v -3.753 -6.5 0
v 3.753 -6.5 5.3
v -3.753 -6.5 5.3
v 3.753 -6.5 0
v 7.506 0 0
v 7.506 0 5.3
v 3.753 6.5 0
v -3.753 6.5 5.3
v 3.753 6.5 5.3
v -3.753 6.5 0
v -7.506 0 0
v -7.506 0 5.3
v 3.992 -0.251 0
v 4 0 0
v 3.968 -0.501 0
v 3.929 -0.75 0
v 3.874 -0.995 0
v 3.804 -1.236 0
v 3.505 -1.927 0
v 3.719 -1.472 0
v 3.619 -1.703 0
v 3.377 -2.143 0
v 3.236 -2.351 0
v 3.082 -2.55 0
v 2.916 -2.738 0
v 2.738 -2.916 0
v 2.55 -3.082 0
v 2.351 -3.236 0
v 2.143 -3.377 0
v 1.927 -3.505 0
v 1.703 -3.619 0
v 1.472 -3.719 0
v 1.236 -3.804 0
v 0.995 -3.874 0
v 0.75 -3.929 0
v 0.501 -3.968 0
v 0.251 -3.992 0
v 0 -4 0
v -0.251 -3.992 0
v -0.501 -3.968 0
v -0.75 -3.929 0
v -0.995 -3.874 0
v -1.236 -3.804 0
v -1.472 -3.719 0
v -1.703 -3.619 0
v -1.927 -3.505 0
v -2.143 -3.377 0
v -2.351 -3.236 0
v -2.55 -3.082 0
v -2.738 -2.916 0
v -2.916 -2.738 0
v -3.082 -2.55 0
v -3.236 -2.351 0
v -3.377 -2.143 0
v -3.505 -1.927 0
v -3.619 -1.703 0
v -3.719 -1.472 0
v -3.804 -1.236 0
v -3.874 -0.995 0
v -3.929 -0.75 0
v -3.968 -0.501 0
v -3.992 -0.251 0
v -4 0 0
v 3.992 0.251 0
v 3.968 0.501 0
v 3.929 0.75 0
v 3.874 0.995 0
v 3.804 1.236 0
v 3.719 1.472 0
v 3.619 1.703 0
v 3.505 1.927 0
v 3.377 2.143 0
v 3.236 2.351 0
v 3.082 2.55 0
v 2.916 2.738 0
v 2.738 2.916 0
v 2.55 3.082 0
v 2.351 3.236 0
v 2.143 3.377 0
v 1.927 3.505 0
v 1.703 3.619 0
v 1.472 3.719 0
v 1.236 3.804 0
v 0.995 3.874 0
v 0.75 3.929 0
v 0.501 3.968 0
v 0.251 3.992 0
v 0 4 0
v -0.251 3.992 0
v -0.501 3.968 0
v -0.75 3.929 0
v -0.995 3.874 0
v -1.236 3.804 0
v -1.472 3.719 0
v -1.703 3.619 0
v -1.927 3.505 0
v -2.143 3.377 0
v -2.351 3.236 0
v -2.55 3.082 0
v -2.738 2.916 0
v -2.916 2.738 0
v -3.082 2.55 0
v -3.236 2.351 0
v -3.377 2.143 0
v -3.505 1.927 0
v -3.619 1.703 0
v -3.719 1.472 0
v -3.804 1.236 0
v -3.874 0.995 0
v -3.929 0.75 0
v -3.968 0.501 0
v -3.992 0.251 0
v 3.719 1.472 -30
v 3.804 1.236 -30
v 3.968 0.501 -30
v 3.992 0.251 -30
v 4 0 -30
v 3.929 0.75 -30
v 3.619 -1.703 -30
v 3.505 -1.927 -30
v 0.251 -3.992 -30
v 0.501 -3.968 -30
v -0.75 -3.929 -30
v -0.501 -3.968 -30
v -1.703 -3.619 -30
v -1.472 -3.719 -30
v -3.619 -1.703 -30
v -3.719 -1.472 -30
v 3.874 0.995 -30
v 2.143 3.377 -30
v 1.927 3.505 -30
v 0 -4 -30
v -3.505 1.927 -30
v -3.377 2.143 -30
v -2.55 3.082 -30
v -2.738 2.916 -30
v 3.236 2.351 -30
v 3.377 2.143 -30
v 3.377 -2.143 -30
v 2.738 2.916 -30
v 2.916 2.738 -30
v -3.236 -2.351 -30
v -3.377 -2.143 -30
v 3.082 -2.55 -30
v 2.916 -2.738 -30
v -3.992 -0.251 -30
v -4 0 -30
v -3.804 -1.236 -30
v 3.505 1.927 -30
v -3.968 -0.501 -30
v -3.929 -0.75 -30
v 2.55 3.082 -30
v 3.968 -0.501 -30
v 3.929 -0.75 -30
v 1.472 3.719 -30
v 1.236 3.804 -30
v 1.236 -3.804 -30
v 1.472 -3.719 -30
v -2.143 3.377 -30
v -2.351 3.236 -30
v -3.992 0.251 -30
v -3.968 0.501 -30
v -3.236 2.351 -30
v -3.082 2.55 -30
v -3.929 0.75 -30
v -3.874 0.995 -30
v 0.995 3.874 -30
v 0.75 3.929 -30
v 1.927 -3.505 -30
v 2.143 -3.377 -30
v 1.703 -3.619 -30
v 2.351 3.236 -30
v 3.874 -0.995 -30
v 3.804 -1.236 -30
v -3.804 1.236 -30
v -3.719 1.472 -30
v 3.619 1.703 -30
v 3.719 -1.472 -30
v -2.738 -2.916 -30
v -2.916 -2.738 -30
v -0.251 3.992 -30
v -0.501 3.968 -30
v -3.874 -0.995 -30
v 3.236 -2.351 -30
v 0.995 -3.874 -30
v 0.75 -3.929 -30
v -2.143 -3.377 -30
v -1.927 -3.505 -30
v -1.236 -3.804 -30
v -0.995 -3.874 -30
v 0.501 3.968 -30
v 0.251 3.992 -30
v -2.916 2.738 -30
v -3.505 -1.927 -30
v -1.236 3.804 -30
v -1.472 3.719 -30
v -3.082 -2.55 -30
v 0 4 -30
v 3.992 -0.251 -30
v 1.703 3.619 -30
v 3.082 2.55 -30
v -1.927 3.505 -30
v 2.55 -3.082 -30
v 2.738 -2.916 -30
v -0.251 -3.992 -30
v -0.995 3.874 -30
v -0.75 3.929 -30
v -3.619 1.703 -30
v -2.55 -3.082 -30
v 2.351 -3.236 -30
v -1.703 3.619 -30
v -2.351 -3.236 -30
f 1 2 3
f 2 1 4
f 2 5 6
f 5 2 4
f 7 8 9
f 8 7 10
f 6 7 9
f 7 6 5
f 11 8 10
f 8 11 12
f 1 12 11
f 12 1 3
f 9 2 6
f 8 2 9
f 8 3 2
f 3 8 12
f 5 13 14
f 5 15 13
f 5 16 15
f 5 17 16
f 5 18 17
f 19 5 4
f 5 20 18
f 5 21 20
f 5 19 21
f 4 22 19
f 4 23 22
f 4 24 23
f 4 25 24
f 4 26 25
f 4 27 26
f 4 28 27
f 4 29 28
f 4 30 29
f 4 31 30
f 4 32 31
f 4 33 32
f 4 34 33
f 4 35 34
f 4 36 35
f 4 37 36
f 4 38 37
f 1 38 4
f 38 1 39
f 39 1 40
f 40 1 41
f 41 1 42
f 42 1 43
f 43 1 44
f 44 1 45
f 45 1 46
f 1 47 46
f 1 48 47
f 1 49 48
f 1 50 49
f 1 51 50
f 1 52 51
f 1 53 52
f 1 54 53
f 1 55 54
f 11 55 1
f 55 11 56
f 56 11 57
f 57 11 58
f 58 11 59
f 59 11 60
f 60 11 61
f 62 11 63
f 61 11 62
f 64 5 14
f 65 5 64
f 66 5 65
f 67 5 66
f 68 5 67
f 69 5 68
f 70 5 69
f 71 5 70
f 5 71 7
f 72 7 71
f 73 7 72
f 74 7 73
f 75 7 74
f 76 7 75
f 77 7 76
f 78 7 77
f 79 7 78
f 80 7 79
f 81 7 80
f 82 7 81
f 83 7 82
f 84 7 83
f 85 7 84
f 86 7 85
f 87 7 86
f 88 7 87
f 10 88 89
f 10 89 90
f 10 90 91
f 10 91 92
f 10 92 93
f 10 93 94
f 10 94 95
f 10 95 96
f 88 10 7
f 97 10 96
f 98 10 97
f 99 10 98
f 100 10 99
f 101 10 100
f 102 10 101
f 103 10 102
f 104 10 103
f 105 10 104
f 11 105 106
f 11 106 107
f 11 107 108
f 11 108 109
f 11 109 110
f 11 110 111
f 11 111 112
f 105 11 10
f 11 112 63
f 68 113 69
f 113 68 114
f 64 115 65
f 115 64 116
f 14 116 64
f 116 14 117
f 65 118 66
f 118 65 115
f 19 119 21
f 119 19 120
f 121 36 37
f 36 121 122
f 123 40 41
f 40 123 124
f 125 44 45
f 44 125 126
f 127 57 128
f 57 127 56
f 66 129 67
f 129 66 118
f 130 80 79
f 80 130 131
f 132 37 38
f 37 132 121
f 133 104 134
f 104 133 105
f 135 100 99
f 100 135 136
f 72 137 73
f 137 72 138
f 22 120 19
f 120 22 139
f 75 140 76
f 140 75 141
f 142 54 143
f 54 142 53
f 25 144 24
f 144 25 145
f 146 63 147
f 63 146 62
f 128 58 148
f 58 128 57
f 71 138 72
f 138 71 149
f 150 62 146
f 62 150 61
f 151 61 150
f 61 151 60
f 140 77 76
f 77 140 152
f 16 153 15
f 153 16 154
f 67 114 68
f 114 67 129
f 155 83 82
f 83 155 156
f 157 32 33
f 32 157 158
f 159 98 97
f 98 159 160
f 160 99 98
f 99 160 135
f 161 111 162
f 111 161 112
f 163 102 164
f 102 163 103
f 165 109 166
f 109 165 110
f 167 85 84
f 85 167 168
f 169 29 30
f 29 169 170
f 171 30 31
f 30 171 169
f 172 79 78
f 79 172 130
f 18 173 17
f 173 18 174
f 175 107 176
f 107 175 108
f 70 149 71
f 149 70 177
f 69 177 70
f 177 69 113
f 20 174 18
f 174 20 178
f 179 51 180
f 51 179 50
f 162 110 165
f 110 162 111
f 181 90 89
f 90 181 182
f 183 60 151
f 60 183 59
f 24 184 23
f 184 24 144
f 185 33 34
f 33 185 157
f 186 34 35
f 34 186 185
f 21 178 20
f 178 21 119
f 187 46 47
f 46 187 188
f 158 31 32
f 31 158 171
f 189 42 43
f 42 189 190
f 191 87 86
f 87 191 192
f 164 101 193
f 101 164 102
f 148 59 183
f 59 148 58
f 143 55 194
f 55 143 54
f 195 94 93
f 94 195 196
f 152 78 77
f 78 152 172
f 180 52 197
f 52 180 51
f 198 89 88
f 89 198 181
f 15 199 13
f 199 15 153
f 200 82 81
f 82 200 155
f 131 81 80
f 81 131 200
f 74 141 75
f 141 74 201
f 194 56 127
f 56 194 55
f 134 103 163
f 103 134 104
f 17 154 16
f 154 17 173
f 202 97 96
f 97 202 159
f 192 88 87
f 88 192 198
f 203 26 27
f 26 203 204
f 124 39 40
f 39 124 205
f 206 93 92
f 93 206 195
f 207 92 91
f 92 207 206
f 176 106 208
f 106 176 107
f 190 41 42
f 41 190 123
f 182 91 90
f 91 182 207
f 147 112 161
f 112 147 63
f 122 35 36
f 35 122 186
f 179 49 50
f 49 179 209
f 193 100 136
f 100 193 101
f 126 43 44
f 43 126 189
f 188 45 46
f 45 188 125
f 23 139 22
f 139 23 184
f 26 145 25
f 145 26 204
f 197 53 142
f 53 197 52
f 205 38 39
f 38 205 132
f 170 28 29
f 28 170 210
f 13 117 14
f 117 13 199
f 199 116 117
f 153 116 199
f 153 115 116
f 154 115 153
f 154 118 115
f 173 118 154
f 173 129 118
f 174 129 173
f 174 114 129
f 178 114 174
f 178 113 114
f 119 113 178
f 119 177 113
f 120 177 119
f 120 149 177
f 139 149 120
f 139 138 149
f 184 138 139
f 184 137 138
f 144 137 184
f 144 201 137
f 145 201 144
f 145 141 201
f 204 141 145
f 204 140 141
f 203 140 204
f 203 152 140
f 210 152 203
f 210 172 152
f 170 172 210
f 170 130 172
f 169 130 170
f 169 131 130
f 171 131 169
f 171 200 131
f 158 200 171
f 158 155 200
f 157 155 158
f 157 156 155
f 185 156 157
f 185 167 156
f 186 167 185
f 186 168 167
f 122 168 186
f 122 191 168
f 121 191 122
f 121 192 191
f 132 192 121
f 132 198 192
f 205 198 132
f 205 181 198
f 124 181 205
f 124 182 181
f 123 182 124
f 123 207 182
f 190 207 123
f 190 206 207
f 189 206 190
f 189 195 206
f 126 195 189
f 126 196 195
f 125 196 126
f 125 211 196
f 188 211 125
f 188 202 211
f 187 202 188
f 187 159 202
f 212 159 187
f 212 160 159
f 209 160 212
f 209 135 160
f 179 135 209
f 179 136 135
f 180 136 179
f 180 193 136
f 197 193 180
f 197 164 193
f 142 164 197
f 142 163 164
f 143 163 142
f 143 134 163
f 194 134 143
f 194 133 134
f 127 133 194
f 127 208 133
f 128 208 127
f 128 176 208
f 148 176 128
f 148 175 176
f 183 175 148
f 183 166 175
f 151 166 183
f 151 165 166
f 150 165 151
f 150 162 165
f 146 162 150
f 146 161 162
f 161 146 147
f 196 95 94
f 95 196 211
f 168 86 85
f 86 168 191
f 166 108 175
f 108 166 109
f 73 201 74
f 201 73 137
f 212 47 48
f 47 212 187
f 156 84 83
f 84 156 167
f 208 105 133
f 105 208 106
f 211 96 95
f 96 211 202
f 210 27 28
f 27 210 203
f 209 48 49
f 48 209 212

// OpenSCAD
af = 13;
head_height = 5.3;
shank_diameter = 8;
shank_length = 30;

module m8_hex_bolt() {
    union() {
        cylinder(h = head_height, r = af / sqrt(3), $fn = 6);
        translate([0, 0, -shank_length])
            cylinder(h = shank_length, r = shank_diameter / 2, $fn = 100);
    }
}

m8_hex_bolt();
